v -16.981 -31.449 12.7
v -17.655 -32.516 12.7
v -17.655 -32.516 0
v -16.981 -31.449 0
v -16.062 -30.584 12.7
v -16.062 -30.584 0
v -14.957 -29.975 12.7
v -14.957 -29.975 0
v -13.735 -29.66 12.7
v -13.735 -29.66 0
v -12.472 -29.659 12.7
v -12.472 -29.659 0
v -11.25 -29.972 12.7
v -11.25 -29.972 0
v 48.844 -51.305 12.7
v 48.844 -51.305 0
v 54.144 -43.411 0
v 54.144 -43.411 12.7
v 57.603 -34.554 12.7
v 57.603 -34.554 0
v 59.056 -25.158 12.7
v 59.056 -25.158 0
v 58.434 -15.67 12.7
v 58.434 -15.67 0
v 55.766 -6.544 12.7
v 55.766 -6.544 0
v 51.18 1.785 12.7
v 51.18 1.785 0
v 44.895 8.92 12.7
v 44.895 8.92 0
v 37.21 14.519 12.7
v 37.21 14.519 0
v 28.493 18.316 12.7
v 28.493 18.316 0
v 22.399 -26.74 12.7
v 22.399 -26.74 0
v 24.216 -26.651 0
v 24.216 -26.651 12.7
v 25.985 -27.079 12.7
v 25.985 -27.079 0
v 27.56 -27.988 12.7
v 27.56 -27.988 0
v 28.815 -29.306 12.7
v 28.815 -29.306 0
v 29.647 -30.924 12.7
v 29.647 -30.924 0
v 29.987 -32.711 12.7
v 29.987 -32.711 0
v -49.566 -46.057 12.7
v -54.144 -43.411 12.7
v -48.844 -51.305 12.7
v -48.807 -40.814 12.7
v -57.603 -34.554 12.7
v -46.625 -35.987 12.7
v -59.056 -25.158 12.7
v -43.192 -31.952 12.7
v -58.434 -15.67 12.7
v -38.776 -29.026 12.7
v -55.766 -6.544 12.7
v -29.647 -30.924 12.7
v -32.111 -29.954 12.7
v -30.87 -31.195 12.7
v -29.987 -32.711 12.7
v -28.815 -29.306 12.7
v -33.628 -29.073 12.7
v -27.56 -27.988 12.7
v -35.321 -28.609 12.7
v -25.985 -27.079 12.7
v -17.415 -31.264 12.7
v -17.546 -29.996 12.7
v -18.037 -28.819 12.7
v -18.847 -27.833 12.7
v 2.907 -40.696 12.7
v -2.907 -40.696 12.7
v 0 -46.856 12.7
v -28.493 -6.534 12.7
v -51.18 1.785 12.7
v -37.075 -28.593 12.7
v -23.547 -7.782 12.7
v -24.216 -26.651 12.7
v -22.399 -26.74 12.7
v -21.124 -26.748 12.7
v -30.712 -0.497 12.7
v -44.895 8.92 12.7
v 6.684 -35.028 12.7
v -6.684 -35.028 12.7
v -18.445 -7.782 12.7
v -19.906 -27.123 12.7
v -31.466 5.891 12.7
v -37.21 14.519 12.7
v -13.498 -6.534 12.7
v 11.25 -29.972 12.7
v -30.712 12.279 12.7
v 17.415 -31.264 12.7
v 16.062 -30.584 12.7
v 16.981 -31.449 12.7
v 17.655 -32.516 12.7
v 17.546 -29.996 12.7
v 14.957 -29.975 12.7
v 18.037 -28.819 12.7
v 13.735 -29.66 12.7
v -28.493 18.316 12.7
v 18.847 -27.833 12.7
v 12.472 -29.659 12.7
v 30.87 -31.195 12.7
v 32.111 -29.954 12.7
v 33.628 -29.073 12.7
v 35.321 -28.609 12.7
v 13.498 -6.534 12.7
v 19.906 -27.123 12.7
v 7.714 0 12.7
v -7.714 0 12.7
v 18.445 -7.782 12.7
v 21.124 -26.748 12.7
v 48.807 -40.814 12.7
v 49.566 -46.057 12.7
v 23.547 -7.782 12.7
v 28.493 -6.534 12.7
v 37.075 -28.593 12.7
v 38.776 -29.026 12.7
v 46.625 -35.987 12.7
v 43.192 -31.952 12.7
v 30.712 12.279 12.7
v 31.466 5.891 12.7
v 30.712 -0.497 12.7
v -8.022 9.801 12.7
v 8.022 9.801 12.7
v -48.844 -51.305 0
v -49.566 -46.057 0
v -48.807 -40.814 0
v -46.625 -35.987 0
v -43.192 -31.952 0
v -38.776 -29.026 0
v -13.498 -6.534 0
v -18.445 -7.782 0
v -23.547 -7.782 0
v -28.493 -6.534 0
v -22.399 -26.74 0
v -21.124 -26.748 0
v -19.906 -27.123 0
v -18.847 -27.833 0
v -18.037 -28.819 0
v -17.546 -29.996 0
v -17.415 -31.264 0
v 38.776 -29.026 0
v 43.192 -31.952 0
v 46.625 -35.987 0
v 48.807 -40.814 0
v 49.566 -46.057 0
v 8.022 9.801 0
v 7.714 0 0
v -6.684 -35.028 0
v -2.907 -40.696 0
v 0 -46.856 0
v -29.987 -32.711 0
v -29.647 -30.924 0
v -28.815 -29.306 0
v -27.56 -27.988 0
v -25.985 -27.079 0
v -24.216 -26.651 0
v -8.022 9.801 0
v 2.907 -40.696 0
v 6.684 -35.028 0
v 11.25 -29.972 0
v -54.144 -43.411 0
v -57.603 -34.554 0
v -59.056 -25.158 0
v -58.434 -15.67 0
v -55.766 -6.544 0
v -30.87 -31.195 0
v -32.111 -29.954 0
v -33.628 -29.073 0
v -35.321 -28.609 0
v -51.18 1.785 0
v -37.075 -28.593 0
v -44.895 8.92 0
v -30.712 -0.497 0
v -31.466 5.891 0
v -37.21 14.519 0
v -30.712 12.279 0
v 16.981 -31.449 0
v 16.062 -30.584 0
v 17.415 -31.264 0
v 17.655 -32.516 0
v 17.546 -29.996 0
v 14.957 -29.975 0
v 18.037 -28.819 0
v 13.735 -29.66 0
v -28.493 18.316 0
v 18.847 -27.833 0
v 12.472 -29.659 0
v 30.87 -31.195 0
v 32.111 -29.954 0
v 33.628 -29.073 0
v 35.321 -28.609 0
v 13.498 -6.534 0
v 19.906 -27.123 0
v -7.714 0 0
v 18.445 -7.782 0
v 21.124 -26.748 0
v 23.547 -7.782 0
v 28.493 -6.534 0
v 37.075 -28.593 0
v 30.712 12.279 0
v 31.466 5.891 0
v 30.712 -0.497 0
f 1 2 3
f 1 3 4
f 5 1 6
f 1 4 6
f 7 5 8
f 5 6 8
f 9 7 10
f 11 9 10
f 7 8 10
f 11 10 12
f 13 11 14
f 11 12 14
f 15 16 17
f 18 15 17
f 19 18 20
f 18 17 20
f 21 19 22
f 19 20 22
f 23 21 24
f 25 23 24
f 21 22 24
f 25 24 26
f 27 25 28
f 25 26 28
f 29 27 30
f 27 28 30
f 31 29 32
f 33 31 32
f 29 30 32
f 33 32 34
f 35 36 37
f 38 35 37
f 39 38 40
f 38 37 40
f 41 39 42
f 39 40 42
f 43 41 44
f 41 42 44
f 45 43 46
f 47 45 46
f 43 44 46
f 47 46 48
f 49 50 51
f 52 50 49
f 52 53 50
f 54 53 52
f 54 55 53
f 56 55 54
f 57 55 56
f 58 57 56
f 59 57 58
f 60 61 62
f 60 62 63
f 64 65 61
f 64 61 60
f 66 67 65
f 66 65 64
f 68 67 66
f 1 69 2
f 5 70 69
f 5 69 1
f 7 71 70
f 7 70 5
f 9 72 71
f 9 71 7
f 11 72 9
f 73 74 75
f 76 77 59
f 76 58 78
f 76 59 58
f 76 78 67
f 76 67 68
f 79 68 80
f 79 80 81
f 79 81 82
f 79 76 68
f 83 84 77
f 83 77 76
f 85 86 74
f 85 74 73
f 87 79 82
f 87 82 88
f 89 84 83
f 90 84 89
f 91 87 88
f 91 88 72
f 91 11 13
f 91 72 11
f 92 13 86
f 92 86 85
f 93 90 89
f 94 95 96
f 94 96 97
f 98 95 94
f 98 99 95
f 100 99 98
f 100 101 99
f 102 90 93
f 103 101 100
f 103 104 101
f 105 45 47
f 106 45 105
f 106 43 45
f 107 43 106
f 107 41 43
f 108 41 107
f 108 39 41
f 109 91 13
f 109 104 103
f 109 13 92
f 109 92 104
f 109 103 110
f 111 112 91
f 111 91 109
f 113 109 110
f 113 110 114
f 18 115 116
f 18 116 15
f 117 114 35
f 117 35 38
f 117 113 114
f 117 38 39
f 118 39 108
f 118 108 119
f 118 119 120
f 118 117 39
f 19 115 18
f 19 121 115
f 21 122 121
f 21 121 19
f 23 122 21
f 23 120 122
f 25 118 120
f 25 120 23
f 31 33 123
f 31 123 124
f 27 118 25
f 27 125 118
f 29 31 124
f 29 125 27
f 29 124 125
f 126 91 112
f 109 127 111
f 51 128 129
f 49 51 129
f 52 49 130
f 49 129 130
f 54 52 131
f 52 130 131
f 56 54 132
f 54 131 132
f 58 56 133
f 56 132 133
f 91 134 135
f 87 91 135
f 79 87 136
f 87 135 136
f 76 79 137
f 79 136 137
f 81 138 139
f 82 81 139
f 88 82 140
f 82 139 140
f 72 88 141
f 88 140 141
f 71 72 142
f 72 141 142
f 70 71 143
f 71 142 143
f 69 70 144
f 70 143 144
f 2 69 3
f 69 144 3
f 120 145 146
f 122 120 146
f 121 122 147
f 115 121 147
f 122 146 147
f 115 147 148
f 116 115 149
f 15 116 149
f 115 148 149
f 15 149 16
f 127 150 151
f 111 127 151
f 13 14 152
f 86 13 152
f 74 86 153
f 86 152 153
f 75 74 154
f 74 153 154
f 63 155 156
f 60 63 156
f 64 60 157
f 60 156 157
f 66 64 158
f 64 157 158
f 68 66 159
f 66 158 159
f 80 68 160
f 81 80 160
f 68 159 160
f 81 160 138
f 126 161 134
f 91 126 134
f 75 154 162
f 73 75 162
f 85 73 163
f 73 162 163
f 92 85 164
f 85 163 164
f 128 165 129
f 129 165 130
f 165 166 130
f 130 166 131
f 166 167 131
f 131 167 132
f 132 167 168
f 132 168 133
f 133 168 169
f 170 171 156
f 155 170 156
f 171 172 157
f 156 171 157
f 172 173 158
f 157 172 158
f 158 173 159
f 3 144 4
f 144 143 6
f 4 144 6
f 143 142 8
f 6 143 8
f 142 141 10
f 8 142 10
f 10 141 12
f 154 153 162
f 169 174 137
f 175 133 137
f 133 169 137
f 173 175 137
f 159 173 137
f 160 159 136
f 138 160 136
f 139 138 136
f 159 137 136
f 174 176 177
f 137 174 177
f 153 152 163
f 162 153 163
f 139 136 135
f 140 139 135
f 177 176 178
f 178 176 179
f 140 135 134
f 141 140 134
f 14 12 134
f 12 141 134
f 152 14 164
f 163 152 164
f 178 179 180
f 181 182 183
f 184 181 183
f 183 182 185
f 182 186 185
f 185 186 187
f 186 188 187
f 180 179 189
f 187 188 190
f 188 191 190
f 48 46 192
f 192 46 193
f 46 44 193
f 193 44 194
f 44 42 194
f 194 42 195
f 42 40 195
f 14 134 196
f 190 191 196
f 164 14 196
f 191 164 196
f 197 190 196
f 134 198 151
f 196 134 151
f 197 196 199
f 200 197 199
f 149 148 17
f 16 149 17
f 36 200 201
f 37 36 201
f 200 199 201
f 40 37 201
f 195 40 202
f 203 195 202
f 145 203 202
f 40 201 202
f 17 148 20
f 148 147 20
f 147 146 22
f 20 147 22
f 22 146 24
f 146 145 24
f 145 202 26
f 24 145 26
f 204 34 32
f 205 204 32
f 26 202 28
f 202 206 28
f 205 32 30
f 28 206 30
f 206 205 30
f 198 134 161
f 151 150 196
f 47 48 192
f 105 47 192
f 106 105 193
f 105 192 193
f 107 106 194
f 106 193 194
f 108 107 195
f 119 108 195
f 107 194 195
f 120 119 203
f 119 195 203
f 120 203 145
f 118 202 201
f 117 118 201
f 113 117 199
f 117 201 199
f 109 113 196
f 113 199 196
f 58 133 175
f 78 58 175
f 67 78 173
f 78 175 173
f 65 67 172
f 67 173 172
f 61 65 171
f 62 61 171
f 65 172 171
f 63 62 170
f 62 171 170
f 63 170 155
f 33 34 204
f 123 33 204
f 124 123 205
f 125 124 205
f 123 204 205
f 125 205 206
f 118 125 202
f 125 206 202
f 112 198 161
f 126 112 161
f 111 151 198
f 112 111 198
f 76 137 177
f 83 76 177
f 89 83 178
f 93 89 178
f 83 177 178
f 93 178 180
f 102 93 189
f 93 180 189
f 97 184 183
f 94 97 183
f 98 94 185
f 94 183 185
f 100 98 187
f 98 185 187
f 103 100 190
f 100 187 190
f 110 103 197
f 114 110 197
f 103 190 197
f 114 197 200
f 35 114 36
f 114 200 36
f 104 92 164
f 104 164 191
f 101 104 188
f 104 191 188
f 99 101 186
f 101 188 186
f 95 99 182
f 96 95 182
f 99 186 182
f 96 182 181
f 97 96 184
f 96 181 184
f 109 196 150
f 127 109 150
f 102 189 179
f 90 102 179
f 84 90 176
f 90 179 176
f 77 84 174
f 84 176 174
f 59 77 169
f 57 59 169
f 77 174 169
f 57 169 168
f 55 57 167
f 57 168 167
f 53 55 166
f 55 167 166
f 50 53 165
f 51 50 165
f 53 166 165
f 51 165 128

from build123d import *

# Parameters (mm, degrees)
F1_DEPTH = 12.7


with BuildPart() as f1:
    # F0 (on Top) → F1 (new body)
    with BuildSketch(Plane.XY):
        with BuildLine():
            Line((7.714299, 0), (0, 0))
            Line((0, 0), (-7.714299, 0))
            Line((-7.714299, 0), (-8.022307, 9.800587))
            Line((-8.022307, 9.800587), (-13.498154, -6.533614))
            ThreePointArc((-13.498154, -6.533614), (-20.995744, -7.940171), (-28.493334, -6.533614))
            ThreePointArc((-28.493334, -6.533614), (-31.465941, 5.890964), (-28.493334, 18.315542))
            ThreePointArc((-28.493334, 18.315542), (-57.349967, -11.034002), (-48.843939, -51.30494))
            ThreePointArc((-48.843939, -51.30494), (-47.885852, -38.32362), (-38.775746, -29.026385))
            ThreePointArc((-38.775746, -29.026385), (-33.628454, -29.072653), (-29.987374, -32.711237))
            ThreePointArc((-29.987374, -32.711237), (-27.56038, -27.988323), (-22.399301, -26.739529))
            ThreePointArc((-22.399301, -26.739529), (-18.405939, -28.296448), (-17.654907, -32.516268))
            ThreePointArc((-17.654907, -32.516268), (-14.956693, -29.974504), (-11.249818, -29.972308))
            ThreePointArc((-11.249818, -29.972308), (-4.691706, -37.79257), (0, -46.85641))
            ThreePointArc((0, -46.85641), (4.691706, -37.79257), (11.249818, -29.972308))
            ThreePointArc((11.249818, -29.972308), (14.956693, -29.974504), (17.654907, -32.516268))
            ThreePointArc((17.654907, -32.516268), (18.405939, -28.296448), (22.399301, -26.739529))
            ThreePointArc((22.399301, -26.739529), (27.56038, -27.988323), (29.987374, -32.711237))
            ThreePointArc((29.987374, -32.711237), (33.628454, -29.072653), (38.775746, -29.026385))
            ThreePointArc((38.775746, -29.026385), (47.885852, -38.32362), (48.843939, -51.30494))
            ThreePointArc((48.843939, -51.30494), (57.349967, -11.034002), (28.493334, 18.315542))
            ThreePointArc((28.493334, 18.315542), (31.465941, 5.890964), (28.493334, -6.533614))
            ThreePointArc((28.493334, -6.533614), (20.995744, -7.940171), (13.498154, -6.533614))
            Line((13.498154, -6.533614), (8.022307, 9.800587))
            Line((8.022307, 9.800587), (7.714299, 0))
        make_face()
    extrude(amount=F1_DEPTH)


solid = f1.part
